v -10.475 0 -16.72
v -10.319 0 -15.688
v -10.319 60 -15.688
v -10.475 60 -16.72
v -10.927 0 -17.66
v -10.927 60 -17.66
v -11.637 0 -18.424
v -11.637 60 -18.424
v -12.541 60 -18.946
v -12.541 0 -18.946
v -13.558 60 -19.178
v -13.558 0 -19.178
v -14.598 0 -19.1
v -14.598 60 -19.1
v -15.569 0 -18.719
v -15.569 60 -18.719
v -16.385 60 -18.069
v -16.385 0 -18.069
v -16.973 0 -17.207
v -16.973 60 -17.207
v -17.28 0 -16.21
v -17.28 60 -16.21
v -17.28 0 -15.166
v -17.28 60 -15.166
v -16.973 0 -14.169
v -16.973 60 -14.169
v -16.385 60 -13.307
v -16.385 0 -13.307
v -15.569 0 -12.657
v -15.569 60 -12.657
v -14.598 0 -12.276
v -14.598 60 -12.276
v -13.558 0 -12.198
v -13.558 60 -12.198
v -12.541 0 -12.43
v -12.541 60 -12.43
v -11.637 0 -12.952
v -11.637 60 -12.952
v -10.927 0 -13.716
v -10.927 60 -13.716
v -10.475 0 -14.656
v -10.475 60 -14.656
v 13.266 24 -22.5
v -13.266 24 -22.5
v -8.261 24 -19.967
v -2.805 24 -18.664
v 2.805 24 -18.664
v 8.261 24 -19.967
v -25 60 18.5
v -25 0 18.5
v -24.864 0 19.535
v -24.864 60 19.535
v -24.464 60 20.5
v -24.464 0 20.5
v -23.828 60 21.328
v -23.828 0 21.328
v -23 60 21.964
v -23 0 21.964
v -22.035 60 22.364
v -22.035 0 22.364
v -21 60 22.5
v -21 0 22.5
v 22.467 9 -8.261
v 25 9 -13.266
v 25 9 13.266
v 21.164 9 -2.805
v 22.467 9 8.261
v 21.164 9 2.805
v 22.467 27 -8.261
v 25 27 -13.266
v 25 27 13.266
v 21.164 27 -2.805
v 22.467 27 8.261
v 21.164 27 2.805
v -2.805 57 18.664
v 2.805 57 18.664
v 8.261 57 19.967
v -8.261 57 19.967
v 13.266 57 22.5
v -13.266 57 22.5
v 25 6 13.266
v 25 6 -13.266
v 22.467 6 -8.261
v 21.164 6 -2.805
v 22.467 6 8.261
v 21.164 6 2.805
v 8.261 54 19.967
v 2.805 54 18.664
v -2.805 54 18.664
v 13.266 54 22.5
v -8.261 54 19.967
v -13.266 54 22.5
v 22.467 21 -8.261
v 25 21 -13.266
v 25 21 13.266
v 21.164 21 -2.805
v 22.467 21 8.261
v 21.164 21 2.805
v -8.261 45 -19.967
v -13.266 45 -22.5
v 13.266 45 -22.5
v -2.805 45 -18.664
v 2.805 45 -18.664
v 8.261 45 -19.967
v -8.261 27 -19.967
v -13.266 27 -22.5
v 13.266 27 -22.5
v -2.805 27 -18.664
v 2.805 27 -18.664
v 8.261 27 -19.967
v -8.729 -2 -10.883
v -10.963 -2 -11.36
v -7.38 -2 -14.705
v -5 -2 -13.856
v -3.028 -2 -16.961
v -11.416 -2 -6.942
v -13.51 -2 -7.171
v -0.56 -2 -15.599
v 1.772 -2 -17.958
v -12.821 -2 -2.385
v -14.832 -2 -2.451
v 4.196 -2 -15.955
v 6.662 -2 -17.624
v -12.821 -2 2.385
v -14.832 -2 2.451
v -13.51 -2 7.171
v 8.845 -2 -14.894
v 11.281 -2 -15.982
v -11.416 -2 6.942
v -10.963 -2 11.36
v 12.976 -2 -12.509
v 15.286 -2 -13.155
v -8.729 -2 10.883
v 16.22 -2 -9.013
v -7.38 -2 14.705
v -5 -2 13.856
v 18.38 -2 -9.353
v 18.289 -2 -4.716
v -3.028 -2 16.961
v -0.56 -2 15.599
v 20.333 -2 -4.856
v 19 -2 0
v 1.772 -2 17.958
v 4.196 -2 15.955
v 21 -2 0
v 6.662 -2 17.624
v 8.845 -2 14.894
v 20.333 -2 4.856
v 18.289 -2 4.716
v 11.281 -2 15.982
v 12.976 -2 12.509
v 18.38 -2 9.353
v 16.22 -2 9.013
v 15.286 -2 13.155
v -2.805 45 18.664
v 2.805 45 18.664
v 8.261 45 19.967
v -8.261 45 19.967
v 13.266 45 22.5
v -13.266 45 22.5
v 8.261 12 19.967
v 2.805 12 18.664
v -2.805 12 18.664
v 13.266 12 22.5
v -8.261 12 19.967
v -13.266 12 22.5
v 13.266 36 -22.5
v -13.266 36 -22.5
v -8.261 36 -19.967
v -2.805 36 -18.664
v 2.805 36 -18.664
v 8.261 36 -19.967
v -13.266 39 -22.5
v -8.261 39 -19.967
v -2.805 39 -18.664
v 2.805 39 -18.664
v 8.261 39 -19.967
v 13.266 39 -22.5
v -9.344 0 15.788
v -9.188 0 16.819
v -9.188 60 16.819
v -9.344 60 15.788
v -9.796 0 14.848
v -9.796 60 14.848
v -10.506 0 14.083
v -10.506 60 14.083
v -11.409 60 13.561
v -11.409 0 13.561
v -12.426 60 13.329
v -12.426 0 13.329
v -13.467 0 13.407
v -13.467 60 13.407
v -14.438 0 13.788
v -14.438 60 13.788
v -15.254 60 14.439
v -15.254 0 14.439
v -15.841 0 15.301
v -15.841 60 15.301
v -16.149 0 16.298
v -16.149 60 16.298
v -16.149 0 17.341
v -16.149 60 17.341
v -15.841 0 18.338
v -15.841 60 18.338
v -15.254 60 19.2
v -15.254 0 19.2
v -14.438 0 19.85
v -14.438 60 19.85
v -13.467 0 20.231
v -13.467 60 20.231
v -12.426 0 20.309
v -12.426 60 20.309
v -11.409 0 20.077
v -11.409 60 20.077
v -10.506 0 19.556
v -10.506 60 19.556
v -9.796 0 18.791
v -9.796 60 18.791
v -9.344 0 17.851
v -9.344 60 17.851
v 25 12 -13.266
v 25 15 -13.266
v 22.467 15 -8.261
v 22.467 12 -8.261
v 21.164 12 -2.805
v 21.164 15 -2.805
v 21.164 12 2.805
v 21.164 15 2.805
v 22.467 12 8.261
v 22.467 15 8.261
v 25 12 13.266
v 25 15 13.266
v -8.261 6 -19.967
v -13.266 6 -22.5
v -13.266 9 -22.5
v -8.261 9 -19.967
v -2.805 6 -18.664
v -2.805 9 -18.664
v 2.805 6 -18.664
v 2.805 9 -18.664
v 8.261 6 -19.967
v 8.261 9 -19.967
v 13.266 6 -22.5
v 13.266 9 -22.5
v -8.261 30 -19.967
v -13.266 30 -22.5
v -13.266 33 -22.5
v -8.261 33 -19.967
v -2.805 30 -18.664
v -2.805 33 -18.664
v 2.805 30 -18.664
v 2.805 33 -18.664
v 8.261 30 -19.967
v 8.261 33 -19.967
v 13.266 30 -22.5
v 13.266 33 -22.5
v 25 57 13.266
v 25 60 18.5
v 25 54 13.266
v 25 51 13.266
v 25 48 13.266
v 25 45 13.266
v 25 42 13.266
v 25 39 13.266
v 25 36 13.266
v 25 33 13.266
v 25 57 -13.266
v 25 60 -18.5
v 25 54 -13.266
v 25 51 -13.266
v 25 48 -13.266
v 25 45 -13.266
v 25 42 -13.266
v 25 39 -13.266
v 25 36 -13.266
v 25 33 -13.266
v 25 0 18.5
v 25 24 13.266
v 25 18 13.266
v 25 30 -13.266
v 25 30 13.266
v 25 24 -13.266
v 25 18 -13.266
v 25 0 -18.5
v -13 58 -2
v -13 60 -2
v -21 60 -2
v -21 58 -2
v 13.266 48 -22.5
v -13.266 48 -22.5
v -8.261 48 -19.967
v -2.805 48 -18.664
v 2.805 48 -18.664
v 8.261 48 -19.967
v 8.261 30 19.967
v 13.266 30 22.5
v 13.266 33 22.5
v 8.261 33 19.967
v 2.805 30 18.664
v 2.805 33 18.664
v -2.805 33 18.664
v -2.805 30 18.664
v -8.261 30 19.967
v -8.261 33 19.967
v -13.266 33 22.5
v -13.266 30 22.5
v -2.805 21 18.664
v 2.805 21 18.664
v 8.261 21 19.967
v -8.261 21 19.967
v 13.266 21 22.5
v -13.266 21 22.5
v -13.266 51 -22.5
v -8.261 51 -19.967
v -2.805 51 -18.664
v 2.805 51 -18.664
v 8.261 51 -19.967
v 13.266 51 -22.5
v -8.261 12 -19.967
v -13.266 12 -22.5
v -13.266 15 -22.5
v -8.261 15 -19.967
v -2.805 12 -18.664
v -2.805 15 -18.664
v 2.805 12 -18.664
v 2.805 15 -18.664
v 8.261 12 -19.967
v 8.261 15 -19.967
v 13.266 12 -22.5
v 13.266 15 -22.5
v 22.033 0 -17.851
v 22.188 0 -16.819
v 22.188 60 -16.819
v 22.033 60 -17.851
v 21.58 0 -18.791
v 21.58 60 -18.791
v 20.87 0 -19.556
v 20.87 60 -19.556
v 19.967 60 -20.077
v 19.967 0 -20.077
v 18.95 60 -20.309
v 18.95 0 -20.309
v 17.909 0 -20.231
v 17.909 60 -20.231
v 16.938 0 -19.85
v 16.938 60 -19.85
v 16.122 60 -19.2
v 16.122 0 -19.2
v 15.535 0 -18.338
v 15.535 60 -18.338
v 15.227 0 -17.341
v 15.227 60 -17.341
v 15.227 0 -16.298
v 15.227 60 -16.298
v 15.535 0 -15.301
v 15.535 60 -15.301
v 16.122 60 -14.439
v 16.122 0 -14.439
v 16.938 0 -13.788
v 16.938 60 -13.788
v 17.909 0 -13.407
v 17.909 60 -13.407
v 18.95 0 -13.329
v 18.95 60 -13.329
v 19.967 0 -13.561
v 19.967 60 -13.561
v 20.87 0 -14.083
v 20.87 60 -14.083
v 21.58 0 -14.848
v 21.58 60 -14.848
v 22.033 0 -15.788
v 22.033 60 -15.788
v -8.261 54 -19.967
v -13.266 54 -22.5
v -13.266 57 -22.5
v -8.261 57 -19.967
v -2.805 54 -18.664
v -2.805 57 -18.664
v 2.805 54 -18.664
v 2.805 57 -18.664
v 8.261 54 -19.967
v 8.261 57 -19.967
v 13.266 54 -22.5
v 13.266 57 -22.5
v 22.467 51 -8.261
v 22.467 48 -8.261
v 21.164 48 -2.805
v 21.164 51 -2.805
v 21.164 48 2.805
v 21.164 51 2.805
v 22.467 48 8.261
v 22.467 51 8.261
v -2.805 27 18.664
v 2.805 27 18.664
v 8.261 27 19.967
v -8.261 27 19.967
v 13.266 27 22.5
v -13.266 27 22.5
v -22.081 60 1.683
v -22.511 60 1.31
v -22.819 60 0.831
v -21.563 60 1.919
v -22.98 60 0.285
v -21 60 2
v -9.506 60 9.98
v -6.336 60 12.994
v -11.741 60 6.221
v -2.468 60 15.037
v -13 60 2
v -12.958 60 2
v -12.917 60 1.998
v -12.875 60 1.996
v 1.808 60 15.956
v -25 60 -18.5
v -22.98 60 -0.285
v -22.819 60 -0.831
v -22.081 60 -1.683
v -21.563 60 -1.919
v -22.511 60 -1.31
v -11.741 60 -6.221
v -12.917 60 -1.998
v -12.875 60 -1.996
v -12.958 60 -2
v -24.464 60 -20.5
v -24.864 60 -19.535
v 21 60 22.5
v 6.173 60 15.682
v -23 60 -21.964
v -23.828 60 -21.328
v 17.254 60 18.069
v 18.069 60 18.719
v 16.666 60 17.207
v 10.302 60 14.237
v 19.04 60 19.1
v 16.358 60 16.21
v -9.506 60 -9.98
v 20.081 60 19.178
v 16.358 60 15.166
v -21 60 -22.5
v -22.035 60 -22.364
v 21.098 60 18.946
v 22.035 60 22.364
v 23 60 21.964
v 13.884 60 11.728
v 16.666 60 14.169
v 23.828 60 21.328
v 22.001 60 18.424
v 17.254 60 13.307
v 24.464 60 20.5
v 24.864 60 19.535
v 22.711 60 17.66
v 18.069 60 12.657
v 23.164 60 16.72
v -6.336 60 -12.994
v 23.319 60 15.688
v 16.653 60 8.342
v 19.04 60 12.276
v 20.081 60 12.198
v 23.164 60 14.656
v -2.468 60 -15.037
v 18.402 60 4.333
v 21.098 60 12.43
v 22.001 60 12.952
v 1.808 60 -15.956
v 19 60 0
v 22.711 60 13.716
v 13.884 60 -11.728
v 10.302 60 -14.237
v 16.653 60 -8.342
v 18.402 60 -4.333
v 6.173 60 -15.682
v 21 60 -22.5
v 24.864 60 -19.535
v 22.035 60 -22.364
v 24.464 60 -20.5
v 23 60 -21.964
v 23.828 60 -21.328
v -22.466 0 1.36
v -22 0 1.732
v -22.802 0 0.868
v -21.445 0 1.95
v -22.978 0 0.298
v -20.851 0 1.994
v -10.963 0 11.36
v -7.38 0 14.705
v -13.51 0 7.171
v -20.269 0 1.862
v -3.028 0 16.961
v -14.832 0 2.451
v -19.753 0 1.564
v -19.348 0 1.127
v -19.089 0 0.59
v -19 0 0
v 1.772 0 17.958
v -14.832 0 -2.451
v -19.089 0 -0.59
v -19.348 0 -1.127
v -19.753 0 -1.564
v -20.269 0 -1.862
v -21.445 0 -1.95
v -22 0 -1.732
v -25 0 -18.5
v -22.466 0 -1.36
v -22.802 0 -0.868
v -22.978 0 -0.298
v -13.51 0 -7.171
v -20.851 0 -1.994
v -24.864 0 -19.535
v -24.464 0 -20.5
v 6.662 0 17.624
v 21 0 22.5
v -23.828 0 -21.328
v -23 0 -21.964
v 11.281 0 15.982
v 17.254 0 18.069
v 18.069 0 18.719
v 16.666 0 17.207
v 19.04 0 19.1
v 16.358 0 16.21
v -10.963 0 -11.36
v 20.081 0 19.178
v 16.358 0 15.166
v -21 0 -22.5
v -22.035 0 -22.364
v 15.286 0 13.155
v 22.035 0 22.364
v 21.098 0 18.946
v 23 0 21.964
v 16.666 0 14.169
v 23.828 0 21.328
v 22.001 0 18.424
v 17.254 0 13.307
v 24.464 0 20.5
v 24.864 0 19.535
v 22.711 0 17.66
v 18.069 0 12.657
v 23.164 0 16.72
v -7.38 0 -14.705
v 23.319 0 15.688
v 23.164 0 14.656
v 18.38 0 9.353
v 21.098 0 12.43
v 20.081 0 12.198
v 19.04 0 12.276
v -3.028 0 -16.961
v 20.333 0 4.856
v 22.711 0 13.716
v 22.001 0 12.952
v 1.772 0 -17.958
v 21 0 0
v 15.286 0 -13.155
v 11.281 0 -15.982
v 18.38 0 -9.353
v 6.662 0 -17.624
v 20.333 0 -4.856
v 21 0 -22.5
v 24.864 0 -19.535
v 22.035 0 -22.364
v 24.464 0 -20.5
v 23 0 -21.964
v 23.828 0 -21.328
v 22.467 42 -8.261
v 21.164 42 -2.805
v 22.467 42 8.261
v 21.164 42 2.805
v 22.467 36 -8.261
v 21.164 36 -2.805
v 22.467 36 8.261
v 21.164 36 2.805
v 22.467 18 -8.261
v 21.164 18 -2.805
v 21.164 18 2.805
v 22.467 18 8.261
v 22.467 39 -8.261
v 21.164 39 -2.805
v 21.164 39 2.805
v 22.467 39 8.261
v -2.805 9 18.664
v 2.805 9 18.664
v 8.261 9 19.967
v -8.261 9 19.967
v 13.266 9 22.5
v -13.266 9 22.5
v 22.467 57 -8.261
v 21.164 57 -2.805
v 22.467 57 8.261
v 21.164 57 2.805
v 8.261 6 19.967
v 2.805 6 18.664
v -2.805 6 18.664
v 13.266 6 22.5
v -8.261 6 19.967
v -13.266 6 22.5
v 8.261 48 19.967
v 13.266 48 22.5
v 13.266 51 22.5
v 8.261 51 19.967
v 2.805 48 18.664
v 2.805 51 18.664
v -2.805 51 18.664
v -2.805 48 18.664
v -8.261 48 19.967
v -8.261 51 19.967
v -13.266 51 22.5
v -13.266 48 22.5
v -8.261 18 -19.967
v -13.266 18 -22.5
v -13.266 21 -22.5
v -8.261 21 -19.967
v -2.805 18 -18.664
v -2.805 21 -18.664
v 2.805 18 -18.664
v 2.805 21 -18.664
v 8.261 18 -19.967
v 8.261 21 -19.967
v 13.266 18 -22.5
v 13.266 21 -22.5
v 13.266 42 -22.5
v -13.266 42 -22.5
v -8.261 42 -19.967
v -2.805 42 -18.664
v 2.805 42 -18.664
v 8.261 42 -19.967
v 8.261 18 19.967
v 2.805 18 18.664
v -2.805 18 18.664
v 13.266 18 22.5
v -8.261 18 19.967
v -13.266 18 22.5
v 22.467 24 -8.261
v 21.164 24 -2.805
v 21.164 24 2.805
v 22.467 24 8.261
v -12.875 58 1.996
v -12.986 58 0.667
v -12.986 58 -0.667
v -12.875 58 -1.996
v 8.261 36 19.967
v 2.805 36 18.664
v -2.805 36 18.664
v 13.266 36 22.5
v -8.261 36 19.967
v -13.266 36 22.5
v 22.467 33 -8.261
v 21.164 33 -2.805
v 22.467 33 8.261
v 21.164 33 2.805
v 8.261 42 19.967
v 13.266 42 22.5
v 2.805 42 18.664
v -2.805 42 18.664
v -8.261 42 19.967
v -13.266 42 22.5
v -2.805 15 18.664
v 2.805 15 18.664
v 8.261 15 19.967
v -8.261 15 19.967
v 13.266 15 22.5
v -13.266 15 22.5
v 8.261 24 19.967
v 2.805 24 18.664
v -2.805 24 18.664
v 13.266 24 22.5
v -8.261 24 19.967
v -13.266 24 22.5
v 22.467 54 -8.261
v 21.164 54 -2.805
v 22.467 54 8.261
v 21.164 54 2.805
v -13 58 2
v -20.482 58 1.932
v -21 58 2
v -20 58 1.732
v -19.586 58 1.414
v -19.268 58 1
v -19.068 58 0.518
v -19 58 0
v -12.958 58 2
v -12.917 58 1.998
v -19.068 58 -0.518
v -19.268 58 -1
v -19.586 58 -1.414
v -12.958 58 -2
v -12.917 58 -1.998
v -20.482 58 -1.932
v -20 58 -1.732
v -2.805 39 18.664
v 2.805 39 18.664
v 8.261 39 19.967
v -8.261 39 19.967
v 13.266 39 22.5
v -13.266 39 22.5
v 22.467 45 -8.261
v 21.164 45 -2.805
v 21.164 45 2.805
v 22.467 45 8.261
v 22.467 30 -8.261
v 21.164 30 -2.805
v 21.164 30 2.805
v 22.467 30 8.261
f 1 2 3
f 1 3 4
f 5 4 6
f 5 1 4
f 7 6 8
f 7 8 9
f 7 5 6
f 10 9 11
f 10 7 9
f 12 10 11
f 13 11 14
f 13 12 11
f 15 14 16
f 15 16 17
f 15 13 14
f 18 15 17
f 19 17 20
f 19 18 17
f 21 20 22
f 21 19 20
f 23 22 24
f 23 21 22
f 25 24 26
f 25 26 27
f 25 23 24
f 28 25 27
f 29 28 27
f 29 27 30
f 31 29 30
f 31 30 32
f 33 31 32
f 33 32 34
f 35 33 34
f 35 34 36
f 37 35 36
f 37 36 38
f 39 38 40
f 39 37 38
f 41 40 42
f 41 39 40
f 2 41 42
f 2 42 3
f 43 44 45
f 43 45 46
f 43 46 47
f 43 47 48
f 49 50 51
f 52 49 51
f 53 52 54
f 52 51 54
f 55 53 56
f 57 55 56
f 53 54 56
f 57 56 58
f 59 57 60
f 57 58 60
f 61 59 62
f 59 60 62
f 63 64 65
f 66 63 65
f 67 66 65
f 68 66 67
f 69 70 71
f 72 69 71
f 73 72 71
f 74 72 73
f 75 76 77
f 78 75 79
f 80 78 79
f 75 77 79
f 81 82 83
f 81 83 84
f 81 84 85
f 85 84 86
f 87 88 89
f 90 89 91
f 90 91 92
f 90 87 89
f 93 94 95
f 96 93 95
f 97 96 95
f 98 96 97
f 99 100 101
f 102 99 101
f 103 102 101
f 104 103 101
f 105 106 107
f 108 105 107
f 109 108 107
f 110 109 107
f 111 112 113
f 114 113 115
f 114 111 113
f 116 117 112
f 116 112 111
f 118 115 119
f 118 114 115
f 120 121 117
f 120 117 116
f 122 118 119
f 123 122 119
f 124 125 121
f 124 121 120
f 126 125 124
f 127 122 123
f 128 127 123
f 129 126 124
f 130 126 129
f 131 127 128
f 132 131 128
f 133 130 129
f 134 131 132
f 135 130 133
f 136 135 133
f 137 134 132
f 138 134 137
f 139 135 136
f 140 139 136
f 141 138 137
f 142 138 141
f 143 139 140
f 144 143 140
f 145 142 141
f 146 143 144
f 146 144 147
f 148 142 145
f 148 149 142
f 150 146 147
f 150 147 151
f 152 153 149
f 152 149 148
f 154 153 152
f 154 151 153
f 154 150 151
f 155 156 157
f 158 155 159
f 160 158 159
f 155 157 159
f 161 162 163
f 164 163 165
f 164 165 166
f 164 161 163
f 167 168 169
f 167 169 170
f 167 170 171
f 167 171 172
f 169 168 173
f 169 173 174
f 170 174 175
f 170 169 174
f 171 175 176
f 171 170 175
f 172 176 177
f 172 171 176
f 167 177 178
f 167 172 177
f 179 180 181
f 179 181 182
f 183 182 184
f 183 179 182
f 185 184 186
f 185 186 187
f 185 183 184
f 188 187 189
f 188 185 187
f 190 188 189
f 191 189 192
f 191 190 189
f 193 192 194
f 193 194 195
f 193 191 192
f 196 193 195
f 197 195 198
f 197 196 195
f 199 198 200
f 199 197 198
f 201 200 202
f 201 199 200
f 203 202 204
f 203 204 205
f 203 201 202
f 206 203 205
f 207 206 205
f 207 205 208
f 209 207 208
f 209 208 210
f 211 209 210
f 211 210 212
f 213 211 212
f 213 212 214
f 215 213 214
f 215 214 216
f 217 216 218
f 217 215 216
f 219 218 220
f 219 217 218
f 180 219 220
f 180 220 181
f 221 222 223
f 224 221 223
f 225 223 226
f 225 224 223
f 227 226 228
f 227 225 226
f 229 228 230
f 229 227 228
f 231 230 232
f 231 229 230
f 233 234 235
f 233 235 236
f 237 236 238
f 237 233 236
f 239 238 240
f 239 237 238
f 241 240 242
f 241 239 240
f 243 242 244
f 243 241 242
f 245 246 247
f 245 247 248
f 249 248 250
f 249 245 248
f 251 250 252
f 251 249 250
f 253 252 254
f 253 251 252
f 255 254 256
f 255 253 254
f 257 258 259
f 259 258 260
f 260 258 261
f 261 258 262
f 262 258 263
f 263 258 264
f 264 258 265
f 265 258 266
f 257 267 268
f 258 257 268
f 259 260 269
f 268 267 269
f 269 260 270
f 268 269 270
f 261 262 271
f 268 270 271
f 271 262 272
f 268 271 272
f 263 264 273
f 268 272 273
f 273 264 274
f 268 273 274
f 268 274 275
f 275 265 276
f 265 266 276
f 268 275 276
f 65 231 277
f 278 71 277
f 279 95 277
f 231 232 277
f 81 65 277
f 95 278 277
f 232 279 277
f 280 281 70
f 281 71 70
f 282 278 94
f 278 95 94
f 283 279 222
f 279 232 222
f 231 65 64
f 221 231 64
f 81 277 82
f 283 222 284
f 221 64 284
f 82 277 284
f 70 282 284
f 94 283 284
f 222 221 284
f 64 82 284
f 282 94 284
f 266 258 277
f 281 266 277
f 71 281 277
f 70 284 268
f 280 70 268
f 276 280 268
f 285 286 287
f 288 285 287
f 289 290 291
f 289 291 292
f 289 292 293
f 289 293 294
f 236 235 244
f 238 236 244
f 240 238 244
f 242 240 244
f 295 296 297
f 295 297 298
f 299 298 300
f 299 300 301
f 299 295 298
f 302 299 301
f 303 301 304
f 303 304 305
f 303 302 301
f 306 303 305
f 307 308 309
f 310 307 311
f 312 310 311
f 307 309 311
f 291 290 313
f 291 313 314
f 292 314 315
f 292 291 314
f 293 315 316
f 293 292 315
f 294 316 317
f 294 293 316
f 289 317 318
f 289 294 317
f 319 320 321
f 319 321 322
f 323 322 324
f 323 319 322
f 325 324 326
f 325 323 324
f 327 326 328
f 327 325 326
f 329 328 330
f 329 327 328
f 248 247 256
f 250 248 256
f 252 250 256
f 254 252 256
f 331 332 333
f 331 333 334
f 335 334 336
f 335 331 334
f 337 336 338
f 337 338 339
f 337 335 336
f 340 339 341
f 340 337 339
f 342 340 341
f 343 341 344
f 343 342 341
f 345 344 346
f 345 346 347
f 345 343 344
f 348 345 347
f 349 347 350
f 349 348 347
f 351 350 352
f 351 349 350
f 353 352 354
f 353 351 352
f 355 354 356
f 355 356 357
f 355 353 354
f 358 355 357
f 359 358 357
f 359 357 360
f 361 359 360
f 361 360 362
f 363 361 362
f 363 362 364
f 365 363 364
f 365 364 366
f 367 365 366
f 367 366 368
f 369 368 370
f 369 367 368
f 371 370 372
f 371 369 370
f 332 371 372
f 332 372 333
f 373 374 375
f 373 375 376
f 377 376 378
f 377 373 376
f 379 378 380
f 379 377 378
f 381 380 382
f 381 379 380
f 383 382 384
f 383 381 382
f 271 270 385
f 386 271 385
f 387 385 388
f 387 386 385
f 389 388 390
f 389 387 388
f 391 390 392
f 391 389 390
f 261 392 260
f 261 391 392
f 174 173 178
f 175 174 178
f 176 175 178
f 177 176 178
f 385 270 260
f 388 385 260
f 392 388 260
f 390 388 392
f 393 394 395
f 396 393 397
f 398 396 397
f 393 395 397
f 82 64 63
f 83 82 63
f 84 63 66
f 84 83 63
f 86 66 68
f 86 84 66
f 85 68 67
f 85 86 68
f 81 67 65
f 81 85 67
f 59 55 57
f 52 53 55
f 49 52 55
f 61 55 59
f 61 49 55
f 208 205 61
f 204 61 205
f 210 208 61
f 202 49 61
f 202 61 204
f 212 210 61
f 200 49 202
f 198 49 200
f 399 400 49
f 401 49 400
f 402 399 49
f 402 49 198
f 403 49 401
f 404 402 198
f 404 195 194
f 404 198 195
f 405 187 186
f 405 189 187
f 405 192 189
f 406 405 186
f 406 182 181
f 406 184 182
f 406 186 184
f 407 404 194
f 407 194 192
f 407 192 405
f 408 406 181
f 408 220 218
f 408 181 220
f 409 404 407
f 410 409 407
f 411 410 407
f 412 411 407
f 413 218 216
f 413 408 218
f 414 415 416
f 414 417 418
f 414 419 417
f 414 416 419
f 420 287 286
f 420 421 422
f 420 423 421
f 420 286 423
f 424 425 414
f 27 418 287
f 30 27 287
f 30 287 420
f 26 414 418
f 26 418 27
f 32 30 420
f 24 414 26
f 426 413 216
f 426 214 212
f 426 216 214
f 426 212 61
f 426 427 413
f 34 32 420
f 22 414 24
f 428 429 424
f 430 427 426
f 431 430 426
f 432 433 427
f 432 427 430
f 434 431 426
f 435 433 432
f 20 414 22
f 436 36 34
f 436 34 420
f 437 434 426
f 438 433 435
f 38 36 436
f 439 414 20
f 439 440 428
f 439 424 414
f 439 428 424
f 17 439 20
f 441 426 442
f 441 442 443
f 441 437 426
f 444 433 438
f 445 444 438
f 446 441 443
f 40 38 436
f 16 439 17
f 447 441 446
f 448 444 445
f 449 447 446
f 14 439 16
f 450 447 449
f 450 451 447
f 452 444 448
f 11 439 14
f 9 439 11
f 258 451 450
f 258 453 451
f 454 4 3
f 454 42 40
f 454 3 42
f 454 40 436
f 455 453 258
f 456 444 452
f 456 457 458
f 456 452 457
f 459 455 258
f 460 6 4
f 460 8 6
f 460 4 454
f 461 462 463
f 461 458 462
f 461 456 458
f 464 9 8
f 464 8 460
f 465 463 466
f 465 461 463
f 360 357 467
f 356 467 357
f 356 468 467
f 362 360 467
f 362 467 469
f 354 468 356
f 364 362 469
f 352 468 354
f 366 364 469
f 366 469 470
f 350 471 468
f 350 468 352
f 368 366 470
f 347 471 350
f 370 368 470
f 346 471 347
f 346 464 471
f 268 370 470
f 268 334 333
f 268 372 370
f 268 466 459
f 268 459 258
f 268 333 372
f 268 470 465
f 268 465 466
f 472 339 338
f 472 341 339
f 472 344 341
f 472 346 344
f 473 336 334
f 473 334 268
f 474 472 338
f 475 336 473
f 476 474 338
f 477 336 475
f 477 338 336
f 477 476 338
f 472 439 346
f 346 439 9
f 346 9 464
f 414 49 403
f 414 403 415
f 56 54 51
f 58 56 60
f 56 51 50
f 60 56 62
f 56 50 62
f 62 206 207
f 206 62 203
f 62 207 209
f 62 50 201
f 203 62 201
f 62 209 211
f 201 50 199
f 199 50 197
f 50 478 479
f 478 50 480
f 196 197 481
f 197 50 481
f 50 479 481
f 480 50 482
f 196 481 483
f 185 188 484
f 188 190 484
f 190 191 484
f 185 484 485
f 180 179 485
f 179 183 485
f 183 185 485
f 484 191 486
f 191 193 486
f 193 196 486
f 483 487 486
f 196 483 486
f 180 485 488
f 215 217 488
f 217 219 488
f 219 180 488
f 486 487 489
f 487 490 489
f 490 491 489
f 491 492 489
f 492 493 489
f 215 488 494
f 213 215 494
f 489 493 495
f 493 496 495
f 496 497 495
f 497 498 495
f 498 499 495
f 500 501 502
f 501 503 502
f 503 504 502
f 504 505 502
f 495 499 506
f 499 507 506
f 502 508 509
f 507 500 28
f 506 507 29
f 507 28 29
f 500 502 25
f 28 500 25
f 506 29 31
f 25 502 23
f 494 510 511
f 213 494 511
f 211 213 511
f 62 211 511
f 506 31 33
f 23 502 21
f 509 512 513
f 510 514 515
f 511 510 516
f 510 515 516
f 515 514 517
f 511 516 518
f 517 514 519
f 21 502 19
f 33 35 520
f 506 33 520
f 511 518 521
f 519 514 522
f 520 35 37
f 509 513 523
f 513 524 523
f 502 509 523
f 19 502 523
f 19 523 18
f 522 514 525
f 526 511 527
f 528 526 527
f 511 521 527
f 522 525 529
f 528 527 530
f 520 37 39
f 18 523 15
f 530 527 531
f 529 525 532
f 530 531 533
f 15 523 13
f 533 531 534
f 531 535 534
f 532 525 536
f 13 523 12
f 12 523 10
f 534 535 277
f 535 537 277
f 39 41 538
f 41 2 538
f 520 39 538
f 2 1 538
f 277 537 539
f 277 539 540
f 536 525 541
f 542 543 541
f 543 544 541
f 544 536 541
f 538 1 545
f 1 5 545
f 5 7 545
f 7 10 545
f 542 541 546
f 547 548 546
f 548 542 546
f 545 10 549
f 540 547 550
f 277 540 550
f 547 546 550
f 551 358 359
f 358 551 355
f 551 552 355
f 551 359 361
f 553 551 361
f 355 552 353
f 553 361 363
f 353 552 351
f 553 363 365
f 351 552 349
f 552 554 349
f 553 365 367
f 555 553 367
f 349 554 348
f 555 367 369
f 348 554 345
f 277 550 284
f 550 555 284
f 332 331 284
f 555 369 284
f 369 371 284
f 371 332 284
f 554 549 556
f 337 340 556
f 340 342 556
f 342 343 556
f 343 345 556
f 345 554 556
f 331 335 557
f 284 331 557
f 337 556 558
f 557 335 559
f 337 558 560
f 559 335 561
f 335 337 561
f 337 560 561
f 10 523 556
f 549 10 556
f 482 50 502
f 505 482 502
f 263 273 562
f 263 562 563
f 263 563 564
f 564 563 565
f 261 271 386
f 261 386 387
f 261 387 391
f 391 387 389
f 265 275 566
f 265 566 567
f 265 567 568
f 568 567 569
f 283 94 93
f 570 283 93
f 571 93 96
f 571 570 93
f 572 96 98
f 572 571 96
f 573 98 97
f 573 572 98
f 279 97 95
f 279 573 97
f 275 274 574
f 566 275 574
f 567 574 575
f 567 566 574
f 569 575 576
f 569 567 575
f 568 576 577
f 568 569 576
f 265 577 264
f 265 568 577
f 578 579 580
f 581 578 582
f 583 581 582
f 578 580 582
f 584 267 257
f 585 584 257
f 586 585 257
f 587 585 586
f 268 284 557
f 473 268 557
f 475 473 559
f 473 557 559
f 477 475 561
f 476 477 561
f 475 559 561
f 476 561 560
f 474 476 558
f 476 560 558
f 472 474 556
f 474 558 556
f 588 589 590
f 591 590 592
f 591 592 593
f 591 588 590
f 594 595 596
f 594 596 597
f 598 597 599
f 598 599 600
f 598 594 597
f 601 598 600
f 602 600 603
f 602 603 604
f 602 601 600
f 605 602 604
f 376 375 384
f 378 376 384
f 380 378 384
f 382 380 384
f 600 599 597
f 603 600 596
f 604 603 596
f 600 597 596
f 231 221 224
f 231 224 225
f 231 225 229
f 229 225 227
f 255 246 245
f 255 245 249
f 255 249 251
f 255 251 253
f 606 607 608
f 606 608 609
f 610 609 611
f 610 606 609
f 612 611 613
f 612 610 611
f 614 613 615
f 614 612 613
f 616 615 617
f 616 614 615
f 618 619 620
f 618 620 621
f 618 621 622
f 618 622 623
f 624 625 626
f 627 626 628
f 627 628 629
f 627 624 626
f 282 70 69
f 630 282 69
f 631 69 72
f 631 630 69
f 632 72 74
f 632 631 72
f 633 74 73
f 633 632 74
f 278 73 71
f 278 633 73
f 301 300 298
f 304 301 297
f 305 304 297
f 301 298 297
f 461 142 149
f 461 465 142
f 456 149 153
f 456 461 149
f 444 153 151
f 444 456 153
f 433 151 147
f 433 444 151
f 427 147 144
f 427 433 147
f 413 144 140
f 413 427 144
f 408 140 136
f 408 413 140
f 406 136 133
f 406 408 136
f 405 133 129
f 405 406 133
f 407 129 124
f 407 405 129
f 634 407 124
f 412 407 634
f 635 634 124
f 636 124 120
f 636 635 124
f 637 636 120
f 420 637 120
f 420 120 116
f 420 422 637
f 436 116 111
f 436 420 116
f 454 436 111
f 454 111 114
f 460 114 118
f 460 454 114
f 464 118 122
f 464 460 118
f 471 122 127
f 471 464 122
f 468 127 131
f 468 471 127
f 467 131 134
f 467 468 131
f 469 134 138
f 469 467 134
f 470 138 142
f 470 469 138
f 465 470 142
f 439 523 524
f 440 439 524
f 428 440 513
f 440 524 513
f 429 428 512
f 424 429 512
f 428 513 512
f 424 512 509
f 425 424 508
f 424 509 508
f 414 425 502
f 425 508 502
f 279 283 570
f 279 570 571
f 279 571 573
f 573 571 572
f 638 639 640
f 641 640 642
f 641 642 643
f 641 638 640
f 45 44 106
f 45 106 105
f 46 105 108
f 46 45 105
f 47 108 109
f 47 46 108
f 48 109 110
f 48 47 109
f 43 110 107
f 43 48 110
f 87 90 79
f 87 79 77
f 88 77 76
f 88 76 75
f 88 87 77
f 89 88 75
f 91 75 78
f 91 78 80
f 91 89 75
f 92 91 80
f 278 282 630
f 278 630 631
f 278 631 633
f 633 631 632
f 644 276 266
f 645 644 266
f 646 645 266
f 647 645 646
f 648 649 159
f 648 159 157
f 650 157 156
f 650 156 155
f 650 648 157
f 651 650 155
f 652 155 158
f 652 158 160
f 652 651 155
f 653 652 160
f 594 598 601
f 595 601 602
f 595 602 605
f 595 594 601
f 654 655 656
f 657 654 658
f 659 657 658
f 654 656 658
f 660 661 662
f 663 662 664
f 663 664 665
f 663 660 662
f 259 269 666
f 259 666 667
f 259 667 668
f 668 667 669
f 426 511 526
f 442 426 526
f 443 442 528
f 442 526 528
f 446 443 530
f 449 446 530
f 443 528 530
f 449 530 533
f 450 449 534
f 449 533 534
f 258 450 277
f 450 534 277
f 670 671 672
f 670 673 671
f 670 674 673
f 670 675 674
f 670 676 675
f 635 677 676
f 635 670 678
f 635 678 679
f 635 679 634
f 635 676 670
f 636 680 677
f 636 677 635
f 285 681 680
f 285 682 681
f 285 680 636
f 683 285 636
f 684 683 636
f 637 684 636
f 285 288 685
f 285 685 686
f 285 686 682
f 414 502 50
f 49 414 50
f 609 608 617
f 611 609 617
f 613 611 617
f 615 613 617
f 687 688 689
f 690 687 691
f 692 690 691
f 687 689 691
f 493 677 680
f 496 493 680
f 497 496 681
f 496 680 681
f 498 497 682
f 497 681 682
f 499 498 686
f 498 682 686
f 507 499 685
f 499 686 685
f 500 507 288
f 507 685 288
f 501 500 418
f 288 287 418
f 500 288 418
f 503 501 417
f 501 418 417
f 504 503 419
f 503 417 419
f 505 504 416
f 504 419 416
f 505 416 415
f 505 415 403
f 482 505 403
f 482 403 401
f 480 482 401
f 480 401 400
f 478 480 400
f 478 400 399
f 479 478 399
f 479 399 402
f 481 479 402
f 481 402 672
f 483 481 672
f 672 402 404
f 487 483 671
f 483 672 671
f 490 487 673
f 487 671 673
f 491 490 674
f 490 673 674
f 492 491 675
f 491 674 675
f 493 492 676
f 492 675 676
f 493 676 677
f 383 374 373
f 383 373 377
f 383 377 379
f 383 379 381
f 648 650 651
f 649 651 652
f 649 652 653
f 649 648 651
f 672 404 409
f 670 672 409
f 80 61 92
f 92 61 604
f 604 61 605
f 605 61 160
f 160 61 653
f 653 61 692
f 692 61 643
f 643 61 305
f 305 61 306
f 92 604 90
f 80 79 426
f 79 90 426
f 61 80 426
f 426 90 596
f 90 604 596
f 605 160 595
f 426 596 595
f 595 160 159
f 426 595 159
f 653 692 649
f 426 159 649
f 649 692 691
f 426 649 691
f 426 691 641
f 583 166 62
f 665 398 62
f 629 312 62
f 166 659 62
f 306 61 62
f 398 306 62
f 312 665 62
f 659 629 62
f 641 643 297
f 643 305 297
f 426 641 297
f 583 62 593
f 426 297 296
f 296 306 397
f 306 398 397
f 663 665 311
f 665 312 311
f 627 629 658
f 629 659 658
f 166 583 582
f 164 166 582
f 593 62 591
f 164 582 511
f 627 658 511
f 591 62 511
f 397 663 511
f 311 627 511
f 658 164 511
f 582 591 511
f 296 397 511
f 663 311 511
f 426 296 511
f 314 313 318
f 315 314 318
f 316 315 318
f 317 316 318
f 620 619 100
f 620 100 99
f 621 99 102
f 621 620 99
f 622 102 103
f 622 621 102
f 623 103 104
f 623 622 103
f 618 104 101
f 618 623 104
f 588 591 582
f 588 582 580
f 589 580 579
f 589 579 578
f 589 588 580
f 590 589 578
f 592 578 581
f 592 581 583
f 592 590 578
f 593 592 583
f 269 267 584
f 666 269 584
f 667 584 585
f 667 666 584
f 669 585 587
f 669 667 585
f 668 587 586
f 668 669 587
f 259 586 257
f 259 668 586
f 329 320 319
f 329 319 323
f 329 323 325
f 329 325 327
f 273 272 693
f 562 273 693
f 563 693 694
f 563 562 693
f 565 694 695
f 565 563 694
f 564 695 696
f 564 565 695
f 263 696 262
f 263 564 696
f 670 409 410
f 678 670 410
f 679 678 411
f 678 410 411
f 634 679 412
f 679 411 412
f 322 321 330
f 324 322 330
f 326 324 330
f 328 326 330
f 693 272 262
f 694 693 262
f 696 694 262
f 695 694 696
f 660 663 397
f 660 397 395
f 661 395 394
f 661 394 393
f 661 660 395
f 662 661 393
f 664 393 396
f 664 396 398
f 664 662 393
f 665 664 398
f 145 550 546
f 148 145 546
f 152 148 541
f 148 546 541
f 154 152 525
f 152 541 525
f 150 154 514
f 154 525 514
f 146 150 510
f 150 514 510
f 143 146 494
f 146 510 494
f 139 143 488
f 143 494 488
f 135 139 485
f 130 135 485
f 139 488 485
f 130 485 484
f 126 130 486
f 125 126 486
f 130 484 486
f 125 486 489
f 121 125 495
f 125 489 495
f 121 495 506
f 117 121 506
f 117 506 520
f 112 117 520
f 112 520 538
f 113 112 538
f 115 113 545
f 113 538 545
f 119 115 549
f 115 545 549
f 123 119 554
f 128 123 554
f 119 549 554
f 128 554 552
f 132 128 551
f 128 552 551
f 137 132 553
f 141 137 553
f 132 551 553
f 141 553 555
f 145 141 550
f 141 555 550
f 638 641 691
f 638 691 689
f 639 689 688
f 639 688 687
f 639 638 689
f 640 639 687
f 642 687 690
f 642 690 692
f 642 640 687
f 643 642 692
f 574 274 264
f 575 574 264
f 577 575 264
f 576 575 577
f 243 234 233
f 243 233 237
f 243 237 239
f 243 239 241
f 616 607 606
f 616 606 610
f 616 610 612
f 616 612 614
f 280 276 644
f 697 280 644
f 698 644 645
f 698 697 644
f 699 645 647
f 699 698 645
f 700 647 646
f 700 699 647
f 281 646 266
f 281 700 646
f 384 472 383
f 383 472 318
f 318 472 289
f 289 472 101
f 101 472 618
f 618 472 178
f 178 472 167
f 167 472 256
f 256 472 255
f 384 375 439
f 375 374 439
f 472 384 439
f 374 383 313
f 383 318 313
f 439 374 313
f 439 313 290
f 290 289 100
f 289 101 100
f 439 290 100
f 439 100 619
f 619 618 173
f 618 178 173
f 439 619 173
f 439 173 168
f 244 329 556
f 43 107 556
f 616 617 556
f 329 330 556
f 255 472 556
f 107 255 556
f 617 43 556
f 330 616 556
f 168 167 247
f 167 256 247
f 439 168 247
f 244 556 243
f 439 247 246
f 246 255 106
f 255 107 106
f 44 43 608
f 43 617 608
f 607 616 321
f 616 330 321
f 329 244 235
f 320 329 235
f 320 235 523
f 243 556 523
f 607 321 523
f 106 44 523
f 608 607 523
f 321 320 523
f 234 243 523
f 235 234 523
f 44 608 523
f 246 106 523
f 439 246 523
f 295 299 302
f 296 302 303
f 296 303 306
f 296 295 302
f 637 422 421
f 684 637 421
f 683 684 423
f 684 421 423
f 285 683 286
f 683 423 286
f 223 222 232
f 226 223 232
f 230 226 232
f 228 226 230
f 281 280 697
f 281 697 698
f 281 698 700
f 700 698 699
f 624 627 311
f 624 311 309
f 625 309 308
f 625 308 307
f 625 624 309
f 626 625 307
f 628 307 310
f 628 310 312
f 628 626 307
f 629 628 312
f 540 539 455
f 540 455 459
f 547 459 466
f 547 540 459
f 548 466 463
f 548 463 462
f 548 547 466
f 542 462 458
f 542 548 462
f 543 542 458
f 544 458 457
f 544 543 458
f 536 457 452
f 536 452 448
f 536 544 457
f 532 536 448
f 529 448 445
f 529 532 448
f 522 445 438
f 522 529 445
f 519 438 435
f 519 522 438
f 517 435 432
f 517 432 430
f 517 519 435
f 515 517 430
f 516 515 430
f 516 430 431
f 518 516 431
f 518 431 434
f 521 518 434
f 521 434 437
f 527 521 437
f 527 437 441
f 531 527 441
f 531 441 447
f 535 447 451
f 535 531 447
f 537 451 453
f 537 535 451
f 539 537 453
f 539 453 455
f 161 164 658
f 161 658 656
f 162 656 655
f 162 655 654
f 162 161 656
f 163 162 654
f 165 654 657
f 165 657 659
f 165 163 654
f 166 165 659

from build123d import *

# Parameters (mm, degrees)
SKETCH1_R               = 3.5
SKETCH1_R_2             = 16
BOSS_EXTRUDE2_DEPTH     = 60
CUT_EXTRUDE6_DEPTH      = 1
CUT_EXTRUDE6_DEPTH_BACK = 2
SKETCH7_R               = 2
CUT_EXTRUDE7_DEPTH      = 59
SKETCH8_R               = 18
SKETCH8_R_2             = 16
BOSS_EXTRUDE3_DEPTH     = 2
CUT_EXTRUDE8_START      = 6
SKETCH9_R               = 24
CUT_EXTRUDE8_DEPTH      = 3
LPATTERN1_COUNT         = 9
LPATTERN1_PITCH         = 6


with BuildPart() as part:
    # Sketch1 → Boss-Extrude2 (new body)
    with BuildSketch(Plane(origin=(0, 0, 0), x_dir=(1, 0, 0), z_dir=(0, 1, 0))):
        with BuildLine():
            Line((-21, -22.5), (21, -22.5))
            ThreePointArc((21, -22.5), (23.828427125, -21.328427125), (25, -18.5))
            Line((25, -18.5), (25, 18.5))
            ThreePointArc((25, 18.5), (23.828427125, 21.328427125), (21, 22.5))
            Line((21, 22.5), (-21, 22.5))
            ThreePointArc((-21, 22.5), (-23.828427125, 21.328427125), (-25, 18.5))
            Line((-25, 18.5), (-25, -18.5))
            ThreePointArc((-25, -18.5), (-23.828427125, -21.328427125), (-21, -22.5))
        make_face()
        with Locations((18.688018935, 16.819217042)):
            Circle(SKETCH1_R, mode=Mode.SUBTRACT)
        with Locations((19.819217042, -15.688018935)):
            Circle(SKETCH1_R, mode=Mode.SUBTRACT)
        with Locations((-12.688018935, -16.819217042)):
            Circle(SKETCH1_R, mode=Mode.SUBTRACT)
        with Locations((-13.819217042, 15.688018935)):
            Circle(SKETCH1_R, mode=Mode.SUBTRACT)
        with Locations((3, 0)):
            Circle(SKETCH1_R_2, mode=Mode.SUBTRACT)
    extrude(amount=BOSS_EXTRUDE2_DEPTH)

    # Sketch6 → Cut-Extrude6 (cut, two sides)
    with BuildSketch(Plane(origin=(0, 60, 0), x_dir=(1, 0, 0), z_dir=(0, 1, 0))) as cut_extrude6_sk:
        with BuildLine():
            Line((-13, 2), (-21, 2))
            ThreePointArc((-21, 2), (-23, 0), (-21, -2))
            Line((-21, -2), (-13, -2))
            ThreePointArc((-13, -2), (-12.93746943, -1.999022243), (-12.875, -1.996089928))
            ThreePointArc((-12.875, -1.996089928), (-13, 0), (-12.875, 1.996089928))
            ThreePointArc((-12.875, 1.996089928), (-12.93746943, 1.999022243), (-13, 2))
        make_face()
    extrude(amount=CUT_EXTRUDE6_DEPTH, mode=Mode.SUBTRACT)
    extrude(cut_extrude6_sk.sketch, amount=-CUT_EXTRUDE6_DEPTH_BACK, mode=Mode.SUBTRACT)

    # Sketch7 → Cut-Extrude7 (cut, through all)
    with BuildSketch(Plane(origin=(0, 58, 0), x_dir=(1, 0, 0), z_dir=(0, 1, 0))):
        with Locations((-21, 0)):
            Circle(SKETCH7_R)
    extrude(amount=-CUT_EXTRUDE7_DEPTH, mode=Mode.SUBTRACT)

    # Sketch8 → Boss-Extrude3 (add)
    with BuildSketch(Plane.XZ):
        with Locations((3, 0)):
            Circle(SKETCH8_R)
        with Locations((3, 0)):
            Circle(SKETCH8_R_2, mode=Mode.SUBTRACT)
    extrude(amount=BOSS_EXTRUDE3_DEPTH)

    # Sketch9 → Cut-Extrude8 (cut)
    with BuildSketch(Plane(origin=(0, 0, 0), x_dir=(1, 0, 0), z_dir=(0, 1, 0)).offset(CUT_EXTRUDE8_START)):
        with Locations((45, 0)):
            Circle(SKETCH9_R)
        with Locations((0, 42.5)):
            Circle(SKETCH9_R)
        with Locations((0, -42.5)):
            Circle(SKETCH9_R)
    cut_extrude8 = extrude(amount=CUT_EXTRUDE8_DEPTH, mode=Mode.SUBTRACT)

    # LPattern1: Cut-Extrude8 ×9
    with Locations(*[(0, i * LPATTERN1_PITCH, 0) for i in range(1, LPATTERN1_COUNT)]):
        add(cut_extrude8, mode=Mode.SUBTRACT)


solid = part.part
